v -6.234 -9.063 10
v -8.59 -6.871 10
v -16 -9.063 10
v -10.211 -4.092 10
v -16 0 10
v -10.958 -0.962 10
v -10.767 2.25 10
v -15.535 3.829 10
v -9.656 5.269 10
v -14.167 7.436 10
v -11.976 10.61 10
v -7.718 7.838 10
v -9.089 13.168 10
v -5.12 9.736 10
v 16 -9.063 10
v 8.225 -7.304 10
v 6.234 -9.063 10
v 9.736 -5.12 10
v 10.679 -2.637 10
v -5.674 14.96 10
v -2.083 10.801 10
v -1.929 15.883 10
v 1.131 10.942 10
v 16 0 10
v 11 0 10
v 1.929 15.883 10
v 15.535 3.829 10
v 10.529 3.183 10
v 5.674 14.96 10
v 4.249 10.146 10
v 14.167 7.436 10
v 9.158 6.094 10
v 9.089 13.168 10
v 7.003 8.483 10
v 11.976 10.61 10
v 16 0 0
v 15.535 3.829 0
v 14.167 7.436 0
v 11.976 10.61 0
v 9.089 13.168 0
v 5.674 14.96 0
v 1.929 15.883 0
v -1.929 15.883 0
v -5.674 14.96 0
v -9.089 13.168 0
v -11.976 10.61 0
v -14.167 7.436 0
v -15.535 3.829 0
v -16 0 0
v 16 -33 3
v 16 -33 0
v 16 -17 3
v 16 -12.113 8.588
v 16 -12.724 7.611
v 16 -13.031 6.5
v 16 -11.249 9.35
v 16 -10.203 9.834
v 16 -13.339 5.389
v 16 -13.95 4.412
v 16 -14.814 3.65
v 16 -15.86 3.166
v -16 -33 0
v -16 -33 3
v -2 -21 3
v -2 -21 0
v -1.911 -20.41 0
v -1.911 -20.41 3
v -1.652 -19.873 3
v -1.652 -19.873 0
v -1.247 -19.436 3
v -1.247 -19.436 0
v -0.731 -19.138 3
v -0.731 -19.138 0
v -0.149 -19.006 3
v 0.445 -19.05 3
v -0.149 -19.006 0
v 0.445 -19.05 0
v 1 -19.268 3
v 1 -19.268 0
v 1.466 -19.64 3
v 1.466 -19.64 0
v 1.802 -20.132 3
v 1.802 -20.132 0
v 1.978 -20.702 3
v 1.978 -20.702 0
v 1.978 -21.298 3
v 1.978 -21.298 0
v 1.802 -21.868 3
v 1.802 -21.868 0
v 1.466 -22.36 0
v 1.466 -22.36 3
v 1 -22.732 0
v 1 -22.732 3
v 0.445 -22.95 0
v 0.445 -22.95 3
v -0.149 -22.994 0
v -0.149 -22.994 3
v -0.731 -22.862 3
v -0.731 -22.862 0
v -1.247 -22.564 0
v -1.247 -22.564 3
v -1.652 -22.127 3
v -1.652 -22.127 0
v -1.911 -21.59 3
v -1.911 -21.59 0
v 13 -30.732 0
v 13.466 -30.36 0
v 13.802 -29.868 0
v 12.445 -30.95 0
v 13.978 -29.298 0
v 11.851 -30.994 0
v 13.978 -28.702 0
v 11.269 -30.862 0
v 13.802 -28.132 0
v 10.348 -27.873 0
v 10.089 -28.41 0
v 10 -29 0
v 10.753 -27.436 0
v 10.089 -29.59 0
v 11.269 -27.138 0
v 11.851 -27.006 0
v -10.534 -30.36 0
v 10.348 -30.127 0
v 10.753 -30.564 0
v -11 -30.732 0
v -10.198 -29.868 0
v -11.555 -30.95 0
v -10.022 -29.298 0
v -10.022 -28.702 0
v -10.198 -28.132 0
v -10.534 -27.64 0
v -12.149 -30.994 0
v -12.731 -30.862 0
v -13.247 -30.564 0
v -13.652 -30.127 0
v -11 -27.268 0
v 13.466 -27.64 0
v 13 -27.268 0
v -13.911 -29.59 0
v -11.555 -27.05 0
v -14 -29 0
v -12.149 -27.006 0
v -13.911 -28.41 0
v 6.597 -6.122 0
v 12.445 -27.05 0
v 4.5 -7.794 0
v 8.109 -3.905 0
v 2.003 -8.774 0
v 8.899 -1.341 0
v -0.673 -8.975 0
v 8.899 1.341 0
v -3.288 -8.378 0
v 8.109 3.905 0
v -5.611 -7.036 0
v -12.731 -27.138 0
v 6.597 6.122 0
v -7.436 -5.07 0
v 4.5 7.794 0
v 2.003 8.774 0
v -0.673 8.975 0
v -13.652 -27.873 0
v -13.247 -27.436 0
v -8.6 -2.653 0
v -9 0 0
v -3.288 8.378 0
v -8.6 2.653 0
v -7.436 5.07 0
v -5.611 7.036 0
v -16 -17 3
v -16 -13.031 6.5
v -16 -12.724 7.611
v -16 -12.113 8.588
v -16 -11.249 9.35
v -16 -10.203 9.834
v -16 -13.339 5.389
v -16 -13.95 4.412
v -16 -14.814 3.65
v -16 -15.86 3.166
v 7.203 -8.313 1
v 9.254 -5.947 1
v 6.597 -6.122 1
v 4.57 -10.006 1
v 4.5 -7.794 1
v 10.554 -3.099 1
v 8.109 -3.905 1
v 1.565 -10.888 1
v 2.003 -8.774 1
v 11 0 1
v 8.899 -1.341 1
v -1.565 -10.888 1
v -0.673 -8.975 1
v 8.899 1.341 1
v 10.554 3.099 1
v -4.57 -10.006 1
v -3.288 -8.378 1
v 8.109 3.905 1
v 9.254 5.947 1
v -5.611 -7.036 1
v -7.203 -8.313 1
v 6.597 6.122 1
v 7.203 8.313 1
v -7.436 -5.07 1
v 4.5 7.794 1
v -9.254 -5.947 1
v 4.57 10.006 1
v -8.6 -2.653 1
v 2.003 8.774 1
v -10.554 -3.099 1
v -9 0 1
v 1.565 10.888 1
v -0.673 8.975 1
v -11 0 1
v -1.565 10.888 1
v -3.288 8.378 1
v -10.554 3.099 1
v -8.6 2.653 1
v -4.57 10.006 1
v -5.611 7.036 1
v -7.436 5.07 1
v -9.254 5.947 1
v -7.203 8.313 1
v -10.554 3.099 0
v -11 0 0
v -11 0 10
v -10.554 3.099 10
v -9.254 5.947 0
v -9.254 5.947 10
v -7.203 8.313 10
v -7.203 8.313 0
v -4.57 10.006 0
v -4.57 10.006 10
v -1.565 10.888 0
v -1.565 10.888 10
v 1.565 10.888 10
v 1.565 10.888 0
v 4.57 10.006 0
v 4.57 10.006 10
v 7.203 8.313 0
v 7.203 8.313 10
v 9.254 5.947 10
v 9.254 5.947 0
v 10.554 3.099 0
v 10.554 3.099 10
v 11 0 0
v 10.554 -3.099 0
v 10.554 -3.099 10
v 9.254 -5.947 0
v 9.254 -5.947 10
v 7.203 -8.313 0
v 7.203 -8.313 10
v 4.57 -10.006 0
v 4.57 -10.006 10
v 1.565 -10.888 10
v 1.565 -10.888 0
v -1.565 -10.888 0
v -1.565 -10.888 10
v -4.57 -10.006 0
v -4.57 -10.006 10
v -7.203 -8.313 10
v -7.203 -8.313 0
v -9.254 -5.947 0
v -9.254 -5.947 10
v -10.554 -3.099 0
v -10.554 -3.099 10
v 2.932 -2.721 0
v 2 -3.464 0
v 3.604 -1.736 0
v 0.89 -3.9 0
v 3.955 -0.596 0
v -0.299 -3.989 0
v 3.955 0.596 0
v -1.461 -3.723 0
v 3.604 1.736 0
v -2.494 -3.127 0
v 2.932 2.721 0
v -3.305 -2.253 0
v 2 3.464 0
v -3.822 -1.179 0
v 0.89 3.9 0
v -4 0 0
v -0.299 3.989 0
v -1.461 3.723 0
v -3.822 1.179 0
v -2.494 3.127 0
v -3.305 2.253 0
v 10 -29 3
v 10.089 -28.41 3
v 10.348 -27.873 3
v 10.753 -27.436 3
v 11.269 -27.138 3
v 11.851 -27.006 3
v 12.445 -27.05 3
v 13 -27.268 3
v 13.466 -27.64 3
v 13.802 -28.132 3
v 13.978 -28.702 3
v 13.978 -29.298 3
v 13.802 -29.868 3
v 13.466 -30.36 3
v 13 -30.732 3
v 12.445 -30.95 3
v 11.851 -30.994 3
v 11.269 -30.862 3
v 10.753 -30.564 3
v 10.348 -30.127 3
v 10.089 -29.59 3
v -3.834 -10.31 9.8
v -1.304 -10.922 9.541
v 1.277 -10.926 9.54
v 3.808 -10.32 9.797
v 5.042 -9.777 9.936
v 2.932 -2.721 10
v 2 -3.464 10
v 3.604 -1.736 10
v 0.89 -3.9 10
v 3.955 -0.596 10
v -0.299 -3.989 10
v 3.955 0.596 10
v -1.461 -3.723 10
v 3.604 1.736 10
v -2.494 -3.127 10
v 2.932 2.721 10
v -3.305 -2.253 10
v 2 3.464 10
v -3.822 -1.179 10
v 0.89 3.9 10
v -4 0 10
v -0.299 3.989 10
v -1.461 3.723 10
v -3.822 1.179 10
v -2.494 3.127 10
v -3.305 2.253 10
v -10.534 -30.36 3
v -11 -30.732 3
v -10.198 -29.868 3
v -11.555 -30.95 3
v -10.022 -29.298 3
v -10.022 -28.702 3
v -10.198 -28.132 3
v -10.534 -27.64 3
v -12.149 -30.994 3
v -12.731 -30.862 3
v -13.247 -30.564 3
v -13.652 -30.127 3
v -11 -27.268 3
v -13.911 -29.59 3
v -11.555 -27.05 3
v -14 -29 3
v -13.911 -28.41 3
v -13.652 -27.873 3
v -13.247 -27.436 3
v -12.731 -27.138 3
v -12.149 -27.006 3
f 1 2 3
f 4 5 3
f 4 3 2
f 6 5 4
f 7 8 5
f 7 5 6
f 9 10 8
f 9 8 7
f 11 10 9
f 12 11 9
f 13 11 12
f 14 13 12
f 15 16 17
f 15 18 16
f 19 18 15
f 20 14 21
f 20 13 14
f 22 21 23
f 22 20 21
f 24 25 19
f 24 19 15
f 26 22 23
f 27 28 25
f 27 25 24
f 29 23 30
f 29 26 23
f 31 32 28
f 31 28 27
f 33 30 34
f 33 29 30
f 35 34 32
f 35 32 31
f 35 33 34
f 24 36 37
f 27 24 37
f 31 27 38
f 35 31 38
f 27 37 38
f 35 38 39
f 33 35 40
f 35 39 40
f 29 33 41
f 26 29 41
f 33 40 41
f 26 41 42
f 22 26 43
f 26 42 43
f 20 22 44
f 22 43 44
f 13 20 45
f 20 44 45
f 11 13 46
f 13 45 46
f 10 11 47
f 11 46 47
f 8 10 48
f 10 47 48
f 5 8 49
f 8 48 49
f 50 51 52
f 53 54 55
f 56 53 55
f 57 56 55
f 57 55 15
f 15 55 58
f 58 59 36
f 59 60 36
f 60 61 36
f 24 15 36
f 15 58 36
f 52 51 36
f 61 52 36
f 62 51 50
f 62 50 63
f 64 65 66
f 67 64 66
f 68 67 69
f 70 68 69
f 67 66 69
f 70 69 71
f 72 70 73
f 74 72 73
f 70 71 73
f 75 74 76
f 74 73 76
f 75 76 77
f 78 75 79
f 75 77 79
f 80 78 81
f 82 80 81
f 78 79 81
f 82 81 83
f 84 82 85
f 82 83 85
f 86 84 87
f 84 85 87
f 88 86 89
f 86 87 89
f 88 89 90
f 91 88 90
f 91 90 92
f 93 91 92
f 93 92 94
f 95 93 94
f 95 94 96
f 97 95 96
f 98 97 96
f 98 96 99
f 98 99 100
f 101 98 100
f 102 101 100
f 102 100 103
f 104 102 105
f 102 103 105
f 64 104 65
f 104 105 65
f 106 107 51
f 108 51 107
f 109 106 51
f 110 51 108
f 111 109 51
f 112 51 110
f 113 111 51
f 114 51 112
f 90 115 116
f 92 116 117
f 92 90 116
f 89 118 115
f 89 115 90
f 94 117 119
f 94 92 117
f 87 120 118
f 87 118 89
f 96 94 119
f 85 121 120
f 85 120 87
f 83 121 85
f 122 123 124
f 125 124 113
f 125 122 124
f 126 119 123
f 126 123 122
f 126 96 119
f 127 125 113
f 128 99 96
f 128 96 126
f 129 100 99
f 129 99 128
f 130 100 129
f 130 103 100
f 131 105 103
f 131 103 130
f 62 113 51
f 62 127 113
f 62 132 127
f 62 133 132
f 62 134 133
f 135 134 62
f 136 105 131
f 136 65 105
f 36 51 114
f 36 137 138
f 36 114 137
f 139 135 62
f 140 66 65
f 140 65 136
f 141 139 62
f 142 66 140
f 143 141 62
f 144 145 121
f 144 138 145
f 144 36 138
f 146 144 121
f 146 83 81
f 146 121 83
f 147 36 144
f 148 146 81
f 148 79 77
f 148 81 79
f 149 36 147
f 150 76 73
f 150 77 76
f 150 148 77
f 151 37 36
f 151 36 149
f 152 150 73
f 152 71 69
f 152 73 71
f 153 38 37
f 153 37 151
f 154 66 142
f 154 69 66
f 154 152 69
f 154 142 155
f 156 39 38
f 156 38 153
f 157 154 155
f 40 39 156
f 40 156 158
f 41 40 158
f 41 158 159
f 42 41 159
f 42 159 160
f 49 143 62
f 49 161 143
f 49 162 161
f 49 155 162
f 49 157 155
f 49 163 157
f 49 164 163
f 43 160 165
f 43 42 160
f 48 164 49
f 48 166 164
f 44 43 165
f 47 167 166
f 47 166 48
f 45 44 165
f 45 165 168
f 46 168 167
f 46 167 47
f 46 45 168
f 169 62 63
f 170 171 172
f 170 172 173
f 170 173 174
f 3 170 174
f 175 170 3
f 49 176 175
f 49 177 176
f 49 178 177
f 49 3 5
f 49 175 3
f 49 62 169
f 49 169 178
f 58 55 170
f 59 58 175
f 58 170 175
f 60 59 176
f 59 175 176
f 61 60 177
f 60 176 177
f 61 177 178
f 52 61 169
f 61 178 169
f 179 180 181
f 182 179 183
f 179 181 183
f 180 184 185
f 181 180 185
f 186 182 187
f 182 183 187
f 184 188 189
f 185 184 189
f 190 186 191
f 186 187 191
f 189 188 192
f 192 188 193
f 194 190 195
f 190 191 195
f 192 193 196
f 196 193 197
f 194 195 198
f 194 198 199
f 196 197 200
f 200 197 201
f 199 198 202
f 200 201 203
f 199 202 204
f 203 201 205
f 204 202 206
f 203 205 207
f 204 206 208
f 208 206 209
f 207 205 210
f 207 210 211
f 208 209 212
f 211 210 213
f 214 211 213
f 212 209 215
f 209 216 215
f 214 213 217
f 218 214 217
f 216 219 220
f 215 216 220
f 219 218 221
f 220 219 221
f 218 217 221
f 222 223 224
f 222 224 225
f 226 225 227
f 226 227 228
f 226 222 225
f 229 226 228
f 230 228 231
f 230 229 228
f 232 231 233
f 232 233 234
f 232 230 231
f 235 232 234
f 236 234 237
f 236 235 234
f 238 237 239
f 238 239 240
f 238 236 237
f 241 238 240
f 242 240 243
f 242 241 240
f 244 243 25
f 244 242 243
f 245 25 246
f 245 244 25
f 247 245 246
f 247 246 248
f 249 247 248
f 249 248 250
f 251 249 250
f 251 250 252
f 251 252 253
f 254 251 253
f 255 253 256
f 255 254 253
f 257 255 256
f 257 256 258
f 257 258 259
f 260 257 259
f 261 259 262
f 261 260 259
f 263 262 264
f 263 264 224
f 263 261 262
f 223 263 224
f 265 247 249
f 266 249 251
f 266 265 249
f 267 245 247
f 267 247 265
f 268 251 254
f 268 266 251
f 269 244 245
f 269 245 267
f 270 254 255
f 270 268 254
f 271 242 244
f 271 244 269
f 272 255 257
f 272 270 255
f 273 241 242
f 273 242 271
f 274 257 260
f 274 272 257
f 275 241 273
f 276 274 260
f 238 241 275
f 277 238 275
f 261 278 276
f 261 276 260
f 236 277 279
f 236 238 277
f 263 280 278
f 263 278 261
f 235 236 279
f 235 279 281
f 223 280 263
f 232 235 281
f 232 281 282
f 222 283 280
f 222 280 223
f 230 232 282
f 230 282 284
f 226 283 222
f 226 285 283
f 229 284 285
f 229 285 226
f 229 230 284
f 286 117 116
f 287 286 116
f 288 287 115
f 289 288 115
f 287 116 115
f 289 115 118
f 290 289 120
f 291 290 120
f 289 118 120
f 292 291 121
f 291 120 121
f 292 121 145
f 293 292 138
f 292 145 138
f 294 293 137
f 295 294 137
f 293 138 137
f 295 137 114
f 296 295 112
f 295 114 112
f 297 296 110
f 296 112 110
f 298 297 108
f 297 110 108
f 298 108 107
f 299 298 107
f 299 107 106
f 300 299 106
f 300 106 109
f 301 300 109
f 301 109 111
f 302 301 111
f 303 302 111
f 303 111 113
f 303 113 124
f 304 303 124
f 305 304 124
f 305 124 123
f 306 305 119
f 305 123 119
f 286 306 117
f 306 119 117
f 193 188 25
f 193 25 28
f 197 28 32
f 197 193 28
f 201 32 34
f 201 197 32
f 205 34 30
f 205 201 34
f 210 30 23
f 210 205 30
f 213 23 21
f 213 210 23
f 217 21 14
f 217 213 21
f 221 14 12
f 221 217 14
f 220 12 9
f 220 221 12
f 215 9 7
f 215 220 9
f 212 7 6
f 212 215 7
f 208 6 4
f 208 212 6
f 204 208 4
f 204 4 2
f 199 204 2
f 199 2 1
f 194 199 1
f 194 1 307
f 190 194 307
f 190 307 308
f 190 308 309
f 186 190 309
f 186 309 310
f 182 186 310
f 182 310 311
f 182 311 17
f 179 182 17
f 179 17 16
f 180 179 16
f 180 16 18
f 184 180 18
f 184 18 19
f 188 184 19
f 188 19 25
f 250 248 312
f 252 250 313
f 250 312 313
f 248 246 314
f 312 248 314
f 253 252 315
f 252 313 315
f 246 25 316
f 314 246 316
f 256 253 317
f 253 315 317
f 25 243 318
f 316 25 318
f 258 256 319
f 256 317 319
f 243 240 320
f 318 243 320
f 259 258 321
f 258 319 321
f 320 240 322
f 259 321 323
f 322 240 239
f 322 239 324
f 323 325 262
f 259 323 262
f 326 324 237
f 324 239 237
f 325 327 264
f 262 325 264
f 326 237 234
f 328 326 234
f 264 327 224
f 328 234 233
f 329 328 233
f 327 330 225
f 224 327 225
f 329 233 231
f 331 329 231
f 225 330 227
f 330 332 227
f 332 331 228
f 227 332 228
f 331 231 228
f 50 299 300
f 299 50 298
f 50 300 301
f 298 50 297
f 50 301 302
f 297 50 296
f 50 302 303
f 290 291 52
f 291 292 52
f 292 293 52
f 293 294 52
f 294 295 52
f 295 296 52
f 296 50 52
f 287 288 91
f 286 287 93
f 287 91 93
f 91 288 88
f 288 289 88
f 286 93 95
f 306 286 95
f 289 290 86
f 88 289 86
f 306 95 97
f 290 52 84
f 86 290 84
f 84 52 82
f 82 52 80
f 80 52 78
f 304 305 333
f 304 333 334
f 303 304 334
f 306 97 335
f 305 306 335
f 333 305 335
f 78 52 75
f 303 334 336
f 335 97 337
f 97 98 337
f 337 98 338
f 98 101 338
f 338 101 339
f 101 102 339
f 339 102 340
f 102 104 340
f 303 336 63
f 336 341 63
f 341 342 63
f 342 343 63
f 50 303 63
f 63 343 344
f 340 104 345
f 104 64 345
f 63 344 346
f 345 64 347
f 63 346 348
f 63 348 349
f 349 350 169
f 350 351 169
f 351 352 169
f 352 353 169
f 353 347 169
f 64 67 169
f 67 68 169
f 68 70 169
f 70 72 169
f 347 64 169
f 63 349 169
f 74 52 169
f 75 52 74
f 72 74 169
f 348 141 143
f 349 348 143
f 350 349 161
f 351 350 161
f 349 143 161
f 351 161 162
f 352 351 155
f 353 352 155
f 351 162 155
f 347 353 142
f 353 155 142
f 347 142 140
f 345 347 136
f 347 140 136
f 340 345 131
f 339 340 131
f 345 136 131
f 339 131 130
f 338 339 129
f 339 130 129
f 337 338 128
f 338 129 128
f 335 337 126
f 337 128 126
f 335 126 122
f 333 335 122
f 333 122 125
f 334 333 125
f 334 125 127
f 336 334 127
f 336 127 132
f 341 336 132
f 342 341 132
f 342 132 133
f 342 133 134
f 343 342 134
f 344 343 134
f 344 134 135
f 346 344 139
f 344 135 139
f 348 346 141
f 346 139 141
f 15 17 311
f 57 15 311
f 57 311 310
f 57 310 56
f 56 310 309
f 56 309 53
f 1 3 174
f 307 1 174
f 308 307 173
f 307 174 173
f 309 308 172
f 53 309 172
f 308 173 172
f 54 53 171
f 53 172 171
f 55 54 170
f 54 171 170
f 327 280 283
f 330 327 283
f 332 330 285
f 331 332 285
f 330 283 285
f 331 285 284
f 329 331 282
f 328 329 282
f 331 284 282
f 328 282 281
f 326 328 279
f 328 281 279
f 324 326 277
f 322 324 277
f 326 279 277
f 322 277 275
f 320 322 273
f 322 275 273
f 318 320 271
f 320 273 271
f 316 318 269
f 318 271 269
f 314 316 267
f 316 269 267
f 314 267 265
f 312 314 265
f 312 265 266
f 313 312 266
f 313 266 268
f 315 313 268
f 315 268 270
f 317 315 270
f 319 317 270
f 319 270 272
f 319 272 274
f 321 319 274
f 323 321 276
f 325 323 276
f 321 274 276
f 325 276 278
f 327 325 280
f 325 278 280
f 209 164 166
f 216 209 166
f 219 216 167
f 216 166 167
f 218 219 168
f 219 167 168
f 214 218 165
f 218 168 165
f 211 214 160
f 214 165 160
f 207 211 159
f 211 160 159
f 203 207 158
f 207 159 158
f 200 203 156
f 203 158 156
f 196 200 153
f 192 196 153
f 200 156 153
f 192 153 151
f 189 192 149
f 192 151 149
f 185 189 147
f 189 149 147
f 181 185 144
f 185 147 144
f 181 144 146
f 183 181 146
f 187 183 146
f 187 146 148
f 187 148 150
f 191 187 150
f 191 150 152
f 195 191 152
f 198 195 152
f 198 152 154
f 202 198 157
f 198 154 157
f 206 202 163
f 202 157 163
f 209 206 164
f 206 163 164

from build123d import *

# Parameters (mm, degrees)
SKETCH1_R           = 11
BOSS_EXTRUDE1_DEPTH = 10
SKETCH2_R           = 11
SKETCH2_R_2         = 4
BOSS_EXTRUDE2_DEPTH = 10
SKETCH3_W           = 32
SKETCH3_H           = 20
SKETCH3_R           = 2
BOSS_EXTRUDE3_DEPTH = 3
FILLET2_R           = 4
FILLET3_R           = 4
SKETCH5_R           = 13
SKETCH5_R_2         = 9
BOSS_EXTRUDE5_DEPTH = 1


with BuildPart() as part:
    # Sketch1 → Boss-Extrude1 (new body)
    with BuildSketch(Plane.XY):
        with BuildLine():
            Line((-16, 0), (-16, -13))
            Line((-16, -13), (16, -13))
            Line((16, -13), (16, 0))
            ThreePointArc((16, 0), (0, 16), (-16, 0))
        make_face()
        Circle(SKETCH1_R, mode=Mode.SUBTRACT)
    extrude(amount=BOSS_EXTRUDE1_DEPTH)

    # Sketch3 → Boss-Extrude3 (add)
    with BuildSketch(Plane(origin=(0, 0, 0), x_dir=(-1, 0, 0), z_dir=(0, 0, -1))):
        with Locations((0, -23)):
            Rectangle(SKETCH3_W, SKETCH3_H)
        with Locations((0, -21)):
            Circle(SKETCH3_R, mode=Mode.SUBTRACT)
        with Locations((12, -29)):
            Circle(SKETCH3_R, mode=Mode.SUBTRACT)
        with Locations((-12, -29)):
            Circle(SKETCH3_R, mode=Mode.SUBTRACT)
    extrude(amount=-BOSS_EXTRUDE3_DEPTH)

    # Fillet2
    fillet2_edges = [part.edges().sort_by_distance(p)[0] for p in [
        (0, -13, 3),
    ]]
    fillet(fillet2_edges, radius=FILLET2_R)

    # Fillet3
    # the kernel refuses this fillet: 4 mm, written as the material it takes off along each edge
    with BuildSketch(Plane(origin=(-25.843134833, -13, 10), x_dir=(0, -0.008963363740973368, -0.9999598282483386), z_dir=(1, 0, 0))) as fillet3_piece_1:
        with BuildLine():
            CenterArc((3.964548274, 3.972949222), FILLET3_R, 180.51356979, 82.819244219)
            Line((-0.035291039, 3.937095767), (-0.43527497, 3.933510421))
            Line((-0.43527497, 3.933510421), (-0.399983931, -0.003585345))
            Line((-0.399983931, -0.003585345), (0.003585345, -0.399983931))
            ThreePointArc((0.003585345, -0.399983931), (3.00346483, -0.37309384), (3.45369984, -0.397294922))
            Line((3.45369984, -0.397294922), (3.500140607, 0))
        make_face()
    extrude(amount=51.686269666, mode=Mode.SUBTRACT)

    # Sketch5 → Boss-Extrude5 (add)
    with BuildSketch(Plane(origin=(0, 0, 0), x_dir=(-1, 0, 0), z_dir=(0, 0, -1))):
        Circle(SKETCH5_R)
        Circle(SKETCH5_R_2, mode=Mode.SUBTRACT)
    extrude(amount=-BOSS_EXTRUDE5_DEPTH)


with BuildPart() as body_2:
    # Sketch2 → Boss-Extrude2 (new body)
    with BuildSketch(Plane(origin=(0, 0, 0), x_dir=(-1, 0, 0), z_dir=(0, 0, -1))):
        Circle(SKETCH2_R)
        Circle(SKETCH2_R_2, mode=Mode.SUBTRACT)
    extrude(amount=-BOSS_EXTRUDE2_DEPTH)


solid = Compound([part.part, body_2.part])
